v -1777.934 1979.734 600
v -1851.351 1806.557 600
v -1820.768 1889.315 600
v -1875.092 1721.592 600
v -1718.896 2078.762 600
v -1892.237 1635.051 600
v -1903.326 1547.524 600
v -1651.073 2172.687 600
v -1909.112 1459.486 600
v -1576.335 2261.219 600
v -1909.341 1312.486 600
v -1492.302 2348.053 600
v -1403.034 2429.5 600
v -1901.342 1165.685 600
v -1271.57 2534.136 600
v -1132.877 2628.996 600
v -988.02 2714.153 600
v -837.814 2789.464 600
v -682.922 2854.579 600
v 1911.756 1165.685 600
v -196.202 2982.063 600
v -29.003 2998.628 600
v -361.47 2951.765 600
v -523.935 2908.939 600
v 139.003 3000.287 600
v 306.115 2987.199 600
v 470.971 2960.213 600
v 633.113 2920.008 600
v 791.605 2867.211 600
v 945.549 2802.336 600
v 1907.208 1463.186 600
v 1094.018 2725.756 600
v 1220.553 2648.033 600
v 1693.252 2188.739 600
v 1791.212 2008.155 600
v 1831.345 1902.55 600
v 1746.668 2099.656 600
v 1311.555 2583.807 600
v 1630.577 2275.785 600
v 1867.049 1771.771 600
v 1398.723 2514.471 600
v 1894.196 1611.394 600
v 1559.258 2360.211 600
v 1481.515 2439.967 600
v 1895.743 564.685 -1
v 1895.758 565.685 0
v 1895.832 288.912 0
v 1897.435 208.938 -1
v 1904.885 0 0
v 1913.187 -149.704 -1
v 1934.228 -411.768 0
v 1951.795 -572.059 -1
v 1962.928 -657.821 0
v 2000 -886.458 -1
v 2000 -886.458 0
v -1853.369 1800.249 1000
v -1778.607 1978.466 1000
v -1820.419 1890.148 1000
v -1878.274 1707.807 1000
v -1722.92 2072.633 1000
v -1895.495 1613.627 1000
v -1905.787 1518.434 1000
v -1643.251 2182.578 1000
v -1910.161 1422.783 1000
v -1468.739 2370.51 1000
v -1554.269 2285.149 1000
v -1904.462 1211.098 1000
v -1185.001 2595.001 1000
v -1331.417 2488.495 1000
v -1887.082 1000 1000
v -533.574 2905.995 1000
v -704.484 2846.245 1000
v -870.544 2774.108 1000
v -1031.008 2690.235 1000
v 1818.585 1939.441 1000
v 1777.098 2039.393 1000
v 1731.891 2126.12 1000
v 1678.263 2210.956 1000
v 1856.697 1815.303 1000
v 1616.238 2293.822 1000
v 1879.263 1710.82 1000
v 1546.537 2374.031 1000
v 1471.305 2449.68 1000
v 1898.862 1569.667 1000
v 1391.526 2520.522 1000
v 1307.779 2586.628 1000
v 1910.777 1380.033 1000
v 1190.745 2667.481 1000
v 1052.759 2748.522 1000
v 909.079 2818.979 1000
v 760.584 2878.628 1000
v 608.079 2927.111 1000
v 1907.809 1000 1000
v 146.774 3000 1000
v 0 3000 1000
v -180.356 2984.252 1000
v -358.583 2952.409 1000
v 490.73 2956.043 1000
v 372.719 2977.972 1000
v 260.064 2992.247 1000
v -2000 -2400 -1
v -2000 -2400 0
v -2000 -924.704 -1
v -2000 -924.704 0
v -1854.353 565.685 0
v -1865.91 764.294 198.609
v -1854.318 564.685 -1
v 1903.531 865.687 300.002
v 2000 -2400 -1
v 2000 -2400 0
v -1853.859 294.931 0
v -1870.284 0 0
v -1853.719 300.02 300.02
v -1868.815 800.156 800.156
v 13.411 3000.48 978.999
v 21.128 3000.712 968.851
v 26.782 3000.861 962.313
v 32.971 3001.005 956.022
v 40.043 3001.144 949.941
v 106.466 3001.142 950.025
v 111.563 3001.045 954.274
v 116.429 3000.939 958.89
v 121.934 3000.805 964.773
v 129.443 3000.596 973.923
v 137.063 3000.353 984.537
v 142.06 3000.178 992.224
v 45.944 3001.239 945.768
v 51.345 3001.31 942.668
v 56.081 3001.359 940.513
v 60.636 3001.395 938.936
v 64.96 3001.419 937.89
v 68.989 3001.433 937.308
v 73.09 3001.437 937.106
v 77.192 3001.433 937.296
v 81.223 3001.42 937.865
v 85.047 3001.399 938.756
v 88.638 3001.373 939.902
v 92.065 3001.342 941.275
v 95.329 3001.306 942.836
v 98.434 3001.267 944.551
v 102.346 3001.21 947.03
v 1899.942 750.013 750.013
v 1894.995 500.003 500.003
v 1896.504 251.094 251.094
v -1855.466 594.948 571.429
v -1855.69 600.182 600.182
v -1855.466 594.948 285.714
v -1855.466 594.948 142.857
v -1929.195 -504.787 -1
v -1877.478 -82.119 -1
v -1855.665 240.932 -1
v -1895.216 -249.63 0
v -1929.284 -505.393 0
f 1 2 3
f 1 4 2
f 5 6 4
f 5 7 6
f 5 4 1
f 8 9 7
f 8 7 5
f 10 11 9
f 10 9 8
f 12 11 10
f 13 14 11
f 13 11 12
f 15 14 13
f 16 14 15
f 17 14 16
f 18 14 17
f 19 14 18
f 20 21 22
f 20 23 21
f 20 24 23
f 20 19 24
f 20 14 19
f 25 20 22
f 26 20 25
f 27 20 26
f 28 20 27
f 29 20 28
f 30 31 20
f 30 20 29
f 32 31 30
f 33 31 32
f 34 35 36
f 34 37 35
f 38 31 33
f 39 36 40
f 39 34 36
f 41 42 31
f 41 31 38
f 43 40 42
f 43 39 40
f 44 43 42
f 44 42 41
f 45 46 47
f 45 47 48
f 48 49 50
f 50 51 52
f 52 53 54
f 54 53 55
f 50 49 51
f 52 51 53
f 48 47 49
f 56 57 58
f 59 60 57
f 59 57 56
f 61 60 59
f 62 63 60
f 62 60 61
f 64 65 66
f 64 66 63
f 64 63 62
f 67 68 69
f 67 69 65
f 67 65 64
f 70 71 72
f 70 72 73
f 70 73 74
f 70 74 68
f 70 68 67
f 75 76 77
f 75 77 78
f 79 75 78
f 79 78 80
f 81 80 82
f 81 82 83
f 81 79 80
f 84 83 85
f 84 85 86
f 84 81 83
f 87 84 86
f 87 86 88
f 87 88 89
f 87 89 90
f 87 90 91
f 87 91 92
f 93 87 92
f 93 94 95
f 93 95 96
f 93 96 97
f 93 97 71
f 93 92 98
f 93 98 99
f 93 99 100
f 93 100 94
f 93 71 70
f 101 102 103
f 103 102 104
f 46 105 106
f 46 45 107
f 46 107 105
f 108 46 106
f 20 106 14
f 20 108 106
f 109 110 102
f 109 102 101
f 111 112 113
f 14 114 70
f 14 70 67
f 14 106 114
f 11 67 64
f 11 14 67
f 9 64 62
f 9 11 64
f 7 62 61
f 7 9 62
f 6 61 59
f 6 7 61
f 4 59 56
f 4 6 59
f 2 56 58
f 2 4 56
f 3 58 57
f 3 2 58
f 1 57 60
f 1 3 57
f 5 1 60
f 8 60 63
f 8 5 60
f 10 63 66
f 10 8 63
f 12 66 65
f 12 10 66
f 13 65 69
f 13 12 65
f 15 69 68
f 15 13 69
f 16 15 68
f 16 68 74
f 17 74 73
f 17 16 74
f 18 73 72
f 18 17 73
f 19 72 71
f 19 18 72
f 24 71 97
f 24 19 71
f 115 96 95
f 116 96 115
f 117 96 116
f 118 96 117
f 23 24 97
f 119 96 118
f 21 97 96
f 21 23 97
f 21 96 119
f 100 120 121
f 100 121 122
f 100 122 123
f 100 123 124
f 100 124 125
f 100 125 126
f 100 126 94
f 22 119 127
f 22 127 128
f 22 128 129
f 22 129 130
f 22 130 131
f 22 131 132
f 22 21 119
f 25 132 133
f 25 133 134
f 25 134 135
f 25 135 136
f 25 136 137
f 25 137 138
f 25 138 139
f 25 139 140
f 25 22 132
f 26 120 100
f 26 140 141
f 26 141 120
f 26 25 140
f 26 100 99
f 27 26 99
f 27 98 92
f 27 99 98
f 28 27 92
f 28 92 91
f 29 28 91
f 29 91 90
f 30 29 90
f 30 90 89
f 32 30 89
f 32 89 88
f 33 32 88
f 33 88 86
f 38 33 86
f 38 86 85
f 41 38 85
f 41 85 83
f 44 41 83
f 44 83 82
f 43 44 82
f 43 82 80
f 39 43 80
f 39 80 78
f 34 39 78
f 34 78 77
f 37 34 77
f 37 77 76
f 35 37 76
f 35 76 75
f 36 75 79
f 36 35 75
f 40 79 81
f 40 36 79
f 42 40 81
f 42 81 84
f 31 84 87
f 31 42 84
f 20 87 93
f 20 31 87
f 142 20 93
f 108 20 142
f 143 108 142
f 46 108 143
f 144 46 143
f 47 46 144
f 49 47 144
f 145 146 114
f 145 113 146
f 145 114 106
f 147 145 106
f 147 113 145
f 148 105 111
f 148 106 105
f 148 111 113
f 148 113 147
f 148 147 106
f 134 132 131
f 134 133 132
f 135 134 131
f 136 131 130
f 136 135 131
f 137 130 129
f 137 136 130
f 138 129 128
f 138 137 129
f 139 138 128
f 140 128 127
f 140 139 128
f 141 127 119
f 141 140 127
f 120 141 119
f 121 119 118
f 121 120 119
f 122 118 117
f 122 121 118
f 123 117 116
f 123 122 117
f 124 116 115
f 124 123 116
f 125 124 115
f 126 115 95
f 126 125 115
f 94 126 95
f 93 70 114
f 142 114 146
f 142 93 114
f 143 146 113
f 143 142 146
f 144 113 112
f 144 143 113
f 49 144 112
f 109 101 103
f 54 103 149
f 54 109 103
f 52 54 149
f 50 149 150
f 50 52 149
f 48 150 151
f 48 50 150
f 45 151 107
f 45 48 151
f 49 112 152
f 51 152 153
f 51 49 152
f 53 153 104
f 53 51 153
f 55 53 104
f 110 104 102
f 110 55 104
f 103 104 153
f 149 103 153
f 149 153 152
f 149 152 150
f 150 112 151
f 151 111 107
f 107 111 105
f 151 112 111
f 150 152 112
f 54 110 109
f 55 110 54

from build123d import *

# Parameters (mm, degrees)
F1_DEPTH      = 2000
F3_DEPTH      = 1000.001
F3_DEPTH_BACK = 25


with BuildPart() as f1:
    # F0 (on Right) → F1 (new body, symmetric)
    with BuildSketch(Plane.YZ):
        Polygon((0, 0), (-2400, 0), (-2400, -1), (564.6854249492, -1), (1165.6854249492, 600), (3009.1400146484, 600), (3000, 1000), (1000, 1000), align=None)
    extrude(amount=F1_DEPTH, both=True)

    # F2 (on Top) → F3 (cut, two sides)
    with BuildSketch(Plane.XY) as f3_sk:
        with BuildLine():
            Line((-2150.7658958435, 3114.8386001587), (-2150.7658958435, -1639.4861936569))
            add(Edge.make_bspline(
                [(-2150.7658958435, -1639.4861936569), (-1968.4842187519, -847.8595203721), (-1718.2601518483, 549.1286813285), (-2152.6533858763, 2078.2070033877), (-7.1759905069, 3444.006307923), (2086.856226983, 2253.3490514909), (1799.6855873754, 624.0863609646), (2033.96651154, -1738.9599241934), (2493.5835084202, -1490.4006136839), (2633.0888271332, -1413.0897521973)],
                knots=[0, 0, 0, 0, 0.169963249, 0.3024719992, 0.4651832044, 0.621906136, 0.7687639473, 0.9284240297, 1, 1, 1, 1], degree=3))
            Line((2633.0888271332, -1413.0897521973), (2485.4388237, 3114.8386001587))
            Line((2485.4388237, 3114.8386001587), (-2150.7658958435, 3114.8386001587))
        make_face()
    extrude(amount=F3_DEPTH, mode=Mode.SUBTRACT)
    extrude(f3_sk.sketch, amount=-F3_DEPTH_BACK, mode=Mode.SUBTRACT)


solid = f1.part
